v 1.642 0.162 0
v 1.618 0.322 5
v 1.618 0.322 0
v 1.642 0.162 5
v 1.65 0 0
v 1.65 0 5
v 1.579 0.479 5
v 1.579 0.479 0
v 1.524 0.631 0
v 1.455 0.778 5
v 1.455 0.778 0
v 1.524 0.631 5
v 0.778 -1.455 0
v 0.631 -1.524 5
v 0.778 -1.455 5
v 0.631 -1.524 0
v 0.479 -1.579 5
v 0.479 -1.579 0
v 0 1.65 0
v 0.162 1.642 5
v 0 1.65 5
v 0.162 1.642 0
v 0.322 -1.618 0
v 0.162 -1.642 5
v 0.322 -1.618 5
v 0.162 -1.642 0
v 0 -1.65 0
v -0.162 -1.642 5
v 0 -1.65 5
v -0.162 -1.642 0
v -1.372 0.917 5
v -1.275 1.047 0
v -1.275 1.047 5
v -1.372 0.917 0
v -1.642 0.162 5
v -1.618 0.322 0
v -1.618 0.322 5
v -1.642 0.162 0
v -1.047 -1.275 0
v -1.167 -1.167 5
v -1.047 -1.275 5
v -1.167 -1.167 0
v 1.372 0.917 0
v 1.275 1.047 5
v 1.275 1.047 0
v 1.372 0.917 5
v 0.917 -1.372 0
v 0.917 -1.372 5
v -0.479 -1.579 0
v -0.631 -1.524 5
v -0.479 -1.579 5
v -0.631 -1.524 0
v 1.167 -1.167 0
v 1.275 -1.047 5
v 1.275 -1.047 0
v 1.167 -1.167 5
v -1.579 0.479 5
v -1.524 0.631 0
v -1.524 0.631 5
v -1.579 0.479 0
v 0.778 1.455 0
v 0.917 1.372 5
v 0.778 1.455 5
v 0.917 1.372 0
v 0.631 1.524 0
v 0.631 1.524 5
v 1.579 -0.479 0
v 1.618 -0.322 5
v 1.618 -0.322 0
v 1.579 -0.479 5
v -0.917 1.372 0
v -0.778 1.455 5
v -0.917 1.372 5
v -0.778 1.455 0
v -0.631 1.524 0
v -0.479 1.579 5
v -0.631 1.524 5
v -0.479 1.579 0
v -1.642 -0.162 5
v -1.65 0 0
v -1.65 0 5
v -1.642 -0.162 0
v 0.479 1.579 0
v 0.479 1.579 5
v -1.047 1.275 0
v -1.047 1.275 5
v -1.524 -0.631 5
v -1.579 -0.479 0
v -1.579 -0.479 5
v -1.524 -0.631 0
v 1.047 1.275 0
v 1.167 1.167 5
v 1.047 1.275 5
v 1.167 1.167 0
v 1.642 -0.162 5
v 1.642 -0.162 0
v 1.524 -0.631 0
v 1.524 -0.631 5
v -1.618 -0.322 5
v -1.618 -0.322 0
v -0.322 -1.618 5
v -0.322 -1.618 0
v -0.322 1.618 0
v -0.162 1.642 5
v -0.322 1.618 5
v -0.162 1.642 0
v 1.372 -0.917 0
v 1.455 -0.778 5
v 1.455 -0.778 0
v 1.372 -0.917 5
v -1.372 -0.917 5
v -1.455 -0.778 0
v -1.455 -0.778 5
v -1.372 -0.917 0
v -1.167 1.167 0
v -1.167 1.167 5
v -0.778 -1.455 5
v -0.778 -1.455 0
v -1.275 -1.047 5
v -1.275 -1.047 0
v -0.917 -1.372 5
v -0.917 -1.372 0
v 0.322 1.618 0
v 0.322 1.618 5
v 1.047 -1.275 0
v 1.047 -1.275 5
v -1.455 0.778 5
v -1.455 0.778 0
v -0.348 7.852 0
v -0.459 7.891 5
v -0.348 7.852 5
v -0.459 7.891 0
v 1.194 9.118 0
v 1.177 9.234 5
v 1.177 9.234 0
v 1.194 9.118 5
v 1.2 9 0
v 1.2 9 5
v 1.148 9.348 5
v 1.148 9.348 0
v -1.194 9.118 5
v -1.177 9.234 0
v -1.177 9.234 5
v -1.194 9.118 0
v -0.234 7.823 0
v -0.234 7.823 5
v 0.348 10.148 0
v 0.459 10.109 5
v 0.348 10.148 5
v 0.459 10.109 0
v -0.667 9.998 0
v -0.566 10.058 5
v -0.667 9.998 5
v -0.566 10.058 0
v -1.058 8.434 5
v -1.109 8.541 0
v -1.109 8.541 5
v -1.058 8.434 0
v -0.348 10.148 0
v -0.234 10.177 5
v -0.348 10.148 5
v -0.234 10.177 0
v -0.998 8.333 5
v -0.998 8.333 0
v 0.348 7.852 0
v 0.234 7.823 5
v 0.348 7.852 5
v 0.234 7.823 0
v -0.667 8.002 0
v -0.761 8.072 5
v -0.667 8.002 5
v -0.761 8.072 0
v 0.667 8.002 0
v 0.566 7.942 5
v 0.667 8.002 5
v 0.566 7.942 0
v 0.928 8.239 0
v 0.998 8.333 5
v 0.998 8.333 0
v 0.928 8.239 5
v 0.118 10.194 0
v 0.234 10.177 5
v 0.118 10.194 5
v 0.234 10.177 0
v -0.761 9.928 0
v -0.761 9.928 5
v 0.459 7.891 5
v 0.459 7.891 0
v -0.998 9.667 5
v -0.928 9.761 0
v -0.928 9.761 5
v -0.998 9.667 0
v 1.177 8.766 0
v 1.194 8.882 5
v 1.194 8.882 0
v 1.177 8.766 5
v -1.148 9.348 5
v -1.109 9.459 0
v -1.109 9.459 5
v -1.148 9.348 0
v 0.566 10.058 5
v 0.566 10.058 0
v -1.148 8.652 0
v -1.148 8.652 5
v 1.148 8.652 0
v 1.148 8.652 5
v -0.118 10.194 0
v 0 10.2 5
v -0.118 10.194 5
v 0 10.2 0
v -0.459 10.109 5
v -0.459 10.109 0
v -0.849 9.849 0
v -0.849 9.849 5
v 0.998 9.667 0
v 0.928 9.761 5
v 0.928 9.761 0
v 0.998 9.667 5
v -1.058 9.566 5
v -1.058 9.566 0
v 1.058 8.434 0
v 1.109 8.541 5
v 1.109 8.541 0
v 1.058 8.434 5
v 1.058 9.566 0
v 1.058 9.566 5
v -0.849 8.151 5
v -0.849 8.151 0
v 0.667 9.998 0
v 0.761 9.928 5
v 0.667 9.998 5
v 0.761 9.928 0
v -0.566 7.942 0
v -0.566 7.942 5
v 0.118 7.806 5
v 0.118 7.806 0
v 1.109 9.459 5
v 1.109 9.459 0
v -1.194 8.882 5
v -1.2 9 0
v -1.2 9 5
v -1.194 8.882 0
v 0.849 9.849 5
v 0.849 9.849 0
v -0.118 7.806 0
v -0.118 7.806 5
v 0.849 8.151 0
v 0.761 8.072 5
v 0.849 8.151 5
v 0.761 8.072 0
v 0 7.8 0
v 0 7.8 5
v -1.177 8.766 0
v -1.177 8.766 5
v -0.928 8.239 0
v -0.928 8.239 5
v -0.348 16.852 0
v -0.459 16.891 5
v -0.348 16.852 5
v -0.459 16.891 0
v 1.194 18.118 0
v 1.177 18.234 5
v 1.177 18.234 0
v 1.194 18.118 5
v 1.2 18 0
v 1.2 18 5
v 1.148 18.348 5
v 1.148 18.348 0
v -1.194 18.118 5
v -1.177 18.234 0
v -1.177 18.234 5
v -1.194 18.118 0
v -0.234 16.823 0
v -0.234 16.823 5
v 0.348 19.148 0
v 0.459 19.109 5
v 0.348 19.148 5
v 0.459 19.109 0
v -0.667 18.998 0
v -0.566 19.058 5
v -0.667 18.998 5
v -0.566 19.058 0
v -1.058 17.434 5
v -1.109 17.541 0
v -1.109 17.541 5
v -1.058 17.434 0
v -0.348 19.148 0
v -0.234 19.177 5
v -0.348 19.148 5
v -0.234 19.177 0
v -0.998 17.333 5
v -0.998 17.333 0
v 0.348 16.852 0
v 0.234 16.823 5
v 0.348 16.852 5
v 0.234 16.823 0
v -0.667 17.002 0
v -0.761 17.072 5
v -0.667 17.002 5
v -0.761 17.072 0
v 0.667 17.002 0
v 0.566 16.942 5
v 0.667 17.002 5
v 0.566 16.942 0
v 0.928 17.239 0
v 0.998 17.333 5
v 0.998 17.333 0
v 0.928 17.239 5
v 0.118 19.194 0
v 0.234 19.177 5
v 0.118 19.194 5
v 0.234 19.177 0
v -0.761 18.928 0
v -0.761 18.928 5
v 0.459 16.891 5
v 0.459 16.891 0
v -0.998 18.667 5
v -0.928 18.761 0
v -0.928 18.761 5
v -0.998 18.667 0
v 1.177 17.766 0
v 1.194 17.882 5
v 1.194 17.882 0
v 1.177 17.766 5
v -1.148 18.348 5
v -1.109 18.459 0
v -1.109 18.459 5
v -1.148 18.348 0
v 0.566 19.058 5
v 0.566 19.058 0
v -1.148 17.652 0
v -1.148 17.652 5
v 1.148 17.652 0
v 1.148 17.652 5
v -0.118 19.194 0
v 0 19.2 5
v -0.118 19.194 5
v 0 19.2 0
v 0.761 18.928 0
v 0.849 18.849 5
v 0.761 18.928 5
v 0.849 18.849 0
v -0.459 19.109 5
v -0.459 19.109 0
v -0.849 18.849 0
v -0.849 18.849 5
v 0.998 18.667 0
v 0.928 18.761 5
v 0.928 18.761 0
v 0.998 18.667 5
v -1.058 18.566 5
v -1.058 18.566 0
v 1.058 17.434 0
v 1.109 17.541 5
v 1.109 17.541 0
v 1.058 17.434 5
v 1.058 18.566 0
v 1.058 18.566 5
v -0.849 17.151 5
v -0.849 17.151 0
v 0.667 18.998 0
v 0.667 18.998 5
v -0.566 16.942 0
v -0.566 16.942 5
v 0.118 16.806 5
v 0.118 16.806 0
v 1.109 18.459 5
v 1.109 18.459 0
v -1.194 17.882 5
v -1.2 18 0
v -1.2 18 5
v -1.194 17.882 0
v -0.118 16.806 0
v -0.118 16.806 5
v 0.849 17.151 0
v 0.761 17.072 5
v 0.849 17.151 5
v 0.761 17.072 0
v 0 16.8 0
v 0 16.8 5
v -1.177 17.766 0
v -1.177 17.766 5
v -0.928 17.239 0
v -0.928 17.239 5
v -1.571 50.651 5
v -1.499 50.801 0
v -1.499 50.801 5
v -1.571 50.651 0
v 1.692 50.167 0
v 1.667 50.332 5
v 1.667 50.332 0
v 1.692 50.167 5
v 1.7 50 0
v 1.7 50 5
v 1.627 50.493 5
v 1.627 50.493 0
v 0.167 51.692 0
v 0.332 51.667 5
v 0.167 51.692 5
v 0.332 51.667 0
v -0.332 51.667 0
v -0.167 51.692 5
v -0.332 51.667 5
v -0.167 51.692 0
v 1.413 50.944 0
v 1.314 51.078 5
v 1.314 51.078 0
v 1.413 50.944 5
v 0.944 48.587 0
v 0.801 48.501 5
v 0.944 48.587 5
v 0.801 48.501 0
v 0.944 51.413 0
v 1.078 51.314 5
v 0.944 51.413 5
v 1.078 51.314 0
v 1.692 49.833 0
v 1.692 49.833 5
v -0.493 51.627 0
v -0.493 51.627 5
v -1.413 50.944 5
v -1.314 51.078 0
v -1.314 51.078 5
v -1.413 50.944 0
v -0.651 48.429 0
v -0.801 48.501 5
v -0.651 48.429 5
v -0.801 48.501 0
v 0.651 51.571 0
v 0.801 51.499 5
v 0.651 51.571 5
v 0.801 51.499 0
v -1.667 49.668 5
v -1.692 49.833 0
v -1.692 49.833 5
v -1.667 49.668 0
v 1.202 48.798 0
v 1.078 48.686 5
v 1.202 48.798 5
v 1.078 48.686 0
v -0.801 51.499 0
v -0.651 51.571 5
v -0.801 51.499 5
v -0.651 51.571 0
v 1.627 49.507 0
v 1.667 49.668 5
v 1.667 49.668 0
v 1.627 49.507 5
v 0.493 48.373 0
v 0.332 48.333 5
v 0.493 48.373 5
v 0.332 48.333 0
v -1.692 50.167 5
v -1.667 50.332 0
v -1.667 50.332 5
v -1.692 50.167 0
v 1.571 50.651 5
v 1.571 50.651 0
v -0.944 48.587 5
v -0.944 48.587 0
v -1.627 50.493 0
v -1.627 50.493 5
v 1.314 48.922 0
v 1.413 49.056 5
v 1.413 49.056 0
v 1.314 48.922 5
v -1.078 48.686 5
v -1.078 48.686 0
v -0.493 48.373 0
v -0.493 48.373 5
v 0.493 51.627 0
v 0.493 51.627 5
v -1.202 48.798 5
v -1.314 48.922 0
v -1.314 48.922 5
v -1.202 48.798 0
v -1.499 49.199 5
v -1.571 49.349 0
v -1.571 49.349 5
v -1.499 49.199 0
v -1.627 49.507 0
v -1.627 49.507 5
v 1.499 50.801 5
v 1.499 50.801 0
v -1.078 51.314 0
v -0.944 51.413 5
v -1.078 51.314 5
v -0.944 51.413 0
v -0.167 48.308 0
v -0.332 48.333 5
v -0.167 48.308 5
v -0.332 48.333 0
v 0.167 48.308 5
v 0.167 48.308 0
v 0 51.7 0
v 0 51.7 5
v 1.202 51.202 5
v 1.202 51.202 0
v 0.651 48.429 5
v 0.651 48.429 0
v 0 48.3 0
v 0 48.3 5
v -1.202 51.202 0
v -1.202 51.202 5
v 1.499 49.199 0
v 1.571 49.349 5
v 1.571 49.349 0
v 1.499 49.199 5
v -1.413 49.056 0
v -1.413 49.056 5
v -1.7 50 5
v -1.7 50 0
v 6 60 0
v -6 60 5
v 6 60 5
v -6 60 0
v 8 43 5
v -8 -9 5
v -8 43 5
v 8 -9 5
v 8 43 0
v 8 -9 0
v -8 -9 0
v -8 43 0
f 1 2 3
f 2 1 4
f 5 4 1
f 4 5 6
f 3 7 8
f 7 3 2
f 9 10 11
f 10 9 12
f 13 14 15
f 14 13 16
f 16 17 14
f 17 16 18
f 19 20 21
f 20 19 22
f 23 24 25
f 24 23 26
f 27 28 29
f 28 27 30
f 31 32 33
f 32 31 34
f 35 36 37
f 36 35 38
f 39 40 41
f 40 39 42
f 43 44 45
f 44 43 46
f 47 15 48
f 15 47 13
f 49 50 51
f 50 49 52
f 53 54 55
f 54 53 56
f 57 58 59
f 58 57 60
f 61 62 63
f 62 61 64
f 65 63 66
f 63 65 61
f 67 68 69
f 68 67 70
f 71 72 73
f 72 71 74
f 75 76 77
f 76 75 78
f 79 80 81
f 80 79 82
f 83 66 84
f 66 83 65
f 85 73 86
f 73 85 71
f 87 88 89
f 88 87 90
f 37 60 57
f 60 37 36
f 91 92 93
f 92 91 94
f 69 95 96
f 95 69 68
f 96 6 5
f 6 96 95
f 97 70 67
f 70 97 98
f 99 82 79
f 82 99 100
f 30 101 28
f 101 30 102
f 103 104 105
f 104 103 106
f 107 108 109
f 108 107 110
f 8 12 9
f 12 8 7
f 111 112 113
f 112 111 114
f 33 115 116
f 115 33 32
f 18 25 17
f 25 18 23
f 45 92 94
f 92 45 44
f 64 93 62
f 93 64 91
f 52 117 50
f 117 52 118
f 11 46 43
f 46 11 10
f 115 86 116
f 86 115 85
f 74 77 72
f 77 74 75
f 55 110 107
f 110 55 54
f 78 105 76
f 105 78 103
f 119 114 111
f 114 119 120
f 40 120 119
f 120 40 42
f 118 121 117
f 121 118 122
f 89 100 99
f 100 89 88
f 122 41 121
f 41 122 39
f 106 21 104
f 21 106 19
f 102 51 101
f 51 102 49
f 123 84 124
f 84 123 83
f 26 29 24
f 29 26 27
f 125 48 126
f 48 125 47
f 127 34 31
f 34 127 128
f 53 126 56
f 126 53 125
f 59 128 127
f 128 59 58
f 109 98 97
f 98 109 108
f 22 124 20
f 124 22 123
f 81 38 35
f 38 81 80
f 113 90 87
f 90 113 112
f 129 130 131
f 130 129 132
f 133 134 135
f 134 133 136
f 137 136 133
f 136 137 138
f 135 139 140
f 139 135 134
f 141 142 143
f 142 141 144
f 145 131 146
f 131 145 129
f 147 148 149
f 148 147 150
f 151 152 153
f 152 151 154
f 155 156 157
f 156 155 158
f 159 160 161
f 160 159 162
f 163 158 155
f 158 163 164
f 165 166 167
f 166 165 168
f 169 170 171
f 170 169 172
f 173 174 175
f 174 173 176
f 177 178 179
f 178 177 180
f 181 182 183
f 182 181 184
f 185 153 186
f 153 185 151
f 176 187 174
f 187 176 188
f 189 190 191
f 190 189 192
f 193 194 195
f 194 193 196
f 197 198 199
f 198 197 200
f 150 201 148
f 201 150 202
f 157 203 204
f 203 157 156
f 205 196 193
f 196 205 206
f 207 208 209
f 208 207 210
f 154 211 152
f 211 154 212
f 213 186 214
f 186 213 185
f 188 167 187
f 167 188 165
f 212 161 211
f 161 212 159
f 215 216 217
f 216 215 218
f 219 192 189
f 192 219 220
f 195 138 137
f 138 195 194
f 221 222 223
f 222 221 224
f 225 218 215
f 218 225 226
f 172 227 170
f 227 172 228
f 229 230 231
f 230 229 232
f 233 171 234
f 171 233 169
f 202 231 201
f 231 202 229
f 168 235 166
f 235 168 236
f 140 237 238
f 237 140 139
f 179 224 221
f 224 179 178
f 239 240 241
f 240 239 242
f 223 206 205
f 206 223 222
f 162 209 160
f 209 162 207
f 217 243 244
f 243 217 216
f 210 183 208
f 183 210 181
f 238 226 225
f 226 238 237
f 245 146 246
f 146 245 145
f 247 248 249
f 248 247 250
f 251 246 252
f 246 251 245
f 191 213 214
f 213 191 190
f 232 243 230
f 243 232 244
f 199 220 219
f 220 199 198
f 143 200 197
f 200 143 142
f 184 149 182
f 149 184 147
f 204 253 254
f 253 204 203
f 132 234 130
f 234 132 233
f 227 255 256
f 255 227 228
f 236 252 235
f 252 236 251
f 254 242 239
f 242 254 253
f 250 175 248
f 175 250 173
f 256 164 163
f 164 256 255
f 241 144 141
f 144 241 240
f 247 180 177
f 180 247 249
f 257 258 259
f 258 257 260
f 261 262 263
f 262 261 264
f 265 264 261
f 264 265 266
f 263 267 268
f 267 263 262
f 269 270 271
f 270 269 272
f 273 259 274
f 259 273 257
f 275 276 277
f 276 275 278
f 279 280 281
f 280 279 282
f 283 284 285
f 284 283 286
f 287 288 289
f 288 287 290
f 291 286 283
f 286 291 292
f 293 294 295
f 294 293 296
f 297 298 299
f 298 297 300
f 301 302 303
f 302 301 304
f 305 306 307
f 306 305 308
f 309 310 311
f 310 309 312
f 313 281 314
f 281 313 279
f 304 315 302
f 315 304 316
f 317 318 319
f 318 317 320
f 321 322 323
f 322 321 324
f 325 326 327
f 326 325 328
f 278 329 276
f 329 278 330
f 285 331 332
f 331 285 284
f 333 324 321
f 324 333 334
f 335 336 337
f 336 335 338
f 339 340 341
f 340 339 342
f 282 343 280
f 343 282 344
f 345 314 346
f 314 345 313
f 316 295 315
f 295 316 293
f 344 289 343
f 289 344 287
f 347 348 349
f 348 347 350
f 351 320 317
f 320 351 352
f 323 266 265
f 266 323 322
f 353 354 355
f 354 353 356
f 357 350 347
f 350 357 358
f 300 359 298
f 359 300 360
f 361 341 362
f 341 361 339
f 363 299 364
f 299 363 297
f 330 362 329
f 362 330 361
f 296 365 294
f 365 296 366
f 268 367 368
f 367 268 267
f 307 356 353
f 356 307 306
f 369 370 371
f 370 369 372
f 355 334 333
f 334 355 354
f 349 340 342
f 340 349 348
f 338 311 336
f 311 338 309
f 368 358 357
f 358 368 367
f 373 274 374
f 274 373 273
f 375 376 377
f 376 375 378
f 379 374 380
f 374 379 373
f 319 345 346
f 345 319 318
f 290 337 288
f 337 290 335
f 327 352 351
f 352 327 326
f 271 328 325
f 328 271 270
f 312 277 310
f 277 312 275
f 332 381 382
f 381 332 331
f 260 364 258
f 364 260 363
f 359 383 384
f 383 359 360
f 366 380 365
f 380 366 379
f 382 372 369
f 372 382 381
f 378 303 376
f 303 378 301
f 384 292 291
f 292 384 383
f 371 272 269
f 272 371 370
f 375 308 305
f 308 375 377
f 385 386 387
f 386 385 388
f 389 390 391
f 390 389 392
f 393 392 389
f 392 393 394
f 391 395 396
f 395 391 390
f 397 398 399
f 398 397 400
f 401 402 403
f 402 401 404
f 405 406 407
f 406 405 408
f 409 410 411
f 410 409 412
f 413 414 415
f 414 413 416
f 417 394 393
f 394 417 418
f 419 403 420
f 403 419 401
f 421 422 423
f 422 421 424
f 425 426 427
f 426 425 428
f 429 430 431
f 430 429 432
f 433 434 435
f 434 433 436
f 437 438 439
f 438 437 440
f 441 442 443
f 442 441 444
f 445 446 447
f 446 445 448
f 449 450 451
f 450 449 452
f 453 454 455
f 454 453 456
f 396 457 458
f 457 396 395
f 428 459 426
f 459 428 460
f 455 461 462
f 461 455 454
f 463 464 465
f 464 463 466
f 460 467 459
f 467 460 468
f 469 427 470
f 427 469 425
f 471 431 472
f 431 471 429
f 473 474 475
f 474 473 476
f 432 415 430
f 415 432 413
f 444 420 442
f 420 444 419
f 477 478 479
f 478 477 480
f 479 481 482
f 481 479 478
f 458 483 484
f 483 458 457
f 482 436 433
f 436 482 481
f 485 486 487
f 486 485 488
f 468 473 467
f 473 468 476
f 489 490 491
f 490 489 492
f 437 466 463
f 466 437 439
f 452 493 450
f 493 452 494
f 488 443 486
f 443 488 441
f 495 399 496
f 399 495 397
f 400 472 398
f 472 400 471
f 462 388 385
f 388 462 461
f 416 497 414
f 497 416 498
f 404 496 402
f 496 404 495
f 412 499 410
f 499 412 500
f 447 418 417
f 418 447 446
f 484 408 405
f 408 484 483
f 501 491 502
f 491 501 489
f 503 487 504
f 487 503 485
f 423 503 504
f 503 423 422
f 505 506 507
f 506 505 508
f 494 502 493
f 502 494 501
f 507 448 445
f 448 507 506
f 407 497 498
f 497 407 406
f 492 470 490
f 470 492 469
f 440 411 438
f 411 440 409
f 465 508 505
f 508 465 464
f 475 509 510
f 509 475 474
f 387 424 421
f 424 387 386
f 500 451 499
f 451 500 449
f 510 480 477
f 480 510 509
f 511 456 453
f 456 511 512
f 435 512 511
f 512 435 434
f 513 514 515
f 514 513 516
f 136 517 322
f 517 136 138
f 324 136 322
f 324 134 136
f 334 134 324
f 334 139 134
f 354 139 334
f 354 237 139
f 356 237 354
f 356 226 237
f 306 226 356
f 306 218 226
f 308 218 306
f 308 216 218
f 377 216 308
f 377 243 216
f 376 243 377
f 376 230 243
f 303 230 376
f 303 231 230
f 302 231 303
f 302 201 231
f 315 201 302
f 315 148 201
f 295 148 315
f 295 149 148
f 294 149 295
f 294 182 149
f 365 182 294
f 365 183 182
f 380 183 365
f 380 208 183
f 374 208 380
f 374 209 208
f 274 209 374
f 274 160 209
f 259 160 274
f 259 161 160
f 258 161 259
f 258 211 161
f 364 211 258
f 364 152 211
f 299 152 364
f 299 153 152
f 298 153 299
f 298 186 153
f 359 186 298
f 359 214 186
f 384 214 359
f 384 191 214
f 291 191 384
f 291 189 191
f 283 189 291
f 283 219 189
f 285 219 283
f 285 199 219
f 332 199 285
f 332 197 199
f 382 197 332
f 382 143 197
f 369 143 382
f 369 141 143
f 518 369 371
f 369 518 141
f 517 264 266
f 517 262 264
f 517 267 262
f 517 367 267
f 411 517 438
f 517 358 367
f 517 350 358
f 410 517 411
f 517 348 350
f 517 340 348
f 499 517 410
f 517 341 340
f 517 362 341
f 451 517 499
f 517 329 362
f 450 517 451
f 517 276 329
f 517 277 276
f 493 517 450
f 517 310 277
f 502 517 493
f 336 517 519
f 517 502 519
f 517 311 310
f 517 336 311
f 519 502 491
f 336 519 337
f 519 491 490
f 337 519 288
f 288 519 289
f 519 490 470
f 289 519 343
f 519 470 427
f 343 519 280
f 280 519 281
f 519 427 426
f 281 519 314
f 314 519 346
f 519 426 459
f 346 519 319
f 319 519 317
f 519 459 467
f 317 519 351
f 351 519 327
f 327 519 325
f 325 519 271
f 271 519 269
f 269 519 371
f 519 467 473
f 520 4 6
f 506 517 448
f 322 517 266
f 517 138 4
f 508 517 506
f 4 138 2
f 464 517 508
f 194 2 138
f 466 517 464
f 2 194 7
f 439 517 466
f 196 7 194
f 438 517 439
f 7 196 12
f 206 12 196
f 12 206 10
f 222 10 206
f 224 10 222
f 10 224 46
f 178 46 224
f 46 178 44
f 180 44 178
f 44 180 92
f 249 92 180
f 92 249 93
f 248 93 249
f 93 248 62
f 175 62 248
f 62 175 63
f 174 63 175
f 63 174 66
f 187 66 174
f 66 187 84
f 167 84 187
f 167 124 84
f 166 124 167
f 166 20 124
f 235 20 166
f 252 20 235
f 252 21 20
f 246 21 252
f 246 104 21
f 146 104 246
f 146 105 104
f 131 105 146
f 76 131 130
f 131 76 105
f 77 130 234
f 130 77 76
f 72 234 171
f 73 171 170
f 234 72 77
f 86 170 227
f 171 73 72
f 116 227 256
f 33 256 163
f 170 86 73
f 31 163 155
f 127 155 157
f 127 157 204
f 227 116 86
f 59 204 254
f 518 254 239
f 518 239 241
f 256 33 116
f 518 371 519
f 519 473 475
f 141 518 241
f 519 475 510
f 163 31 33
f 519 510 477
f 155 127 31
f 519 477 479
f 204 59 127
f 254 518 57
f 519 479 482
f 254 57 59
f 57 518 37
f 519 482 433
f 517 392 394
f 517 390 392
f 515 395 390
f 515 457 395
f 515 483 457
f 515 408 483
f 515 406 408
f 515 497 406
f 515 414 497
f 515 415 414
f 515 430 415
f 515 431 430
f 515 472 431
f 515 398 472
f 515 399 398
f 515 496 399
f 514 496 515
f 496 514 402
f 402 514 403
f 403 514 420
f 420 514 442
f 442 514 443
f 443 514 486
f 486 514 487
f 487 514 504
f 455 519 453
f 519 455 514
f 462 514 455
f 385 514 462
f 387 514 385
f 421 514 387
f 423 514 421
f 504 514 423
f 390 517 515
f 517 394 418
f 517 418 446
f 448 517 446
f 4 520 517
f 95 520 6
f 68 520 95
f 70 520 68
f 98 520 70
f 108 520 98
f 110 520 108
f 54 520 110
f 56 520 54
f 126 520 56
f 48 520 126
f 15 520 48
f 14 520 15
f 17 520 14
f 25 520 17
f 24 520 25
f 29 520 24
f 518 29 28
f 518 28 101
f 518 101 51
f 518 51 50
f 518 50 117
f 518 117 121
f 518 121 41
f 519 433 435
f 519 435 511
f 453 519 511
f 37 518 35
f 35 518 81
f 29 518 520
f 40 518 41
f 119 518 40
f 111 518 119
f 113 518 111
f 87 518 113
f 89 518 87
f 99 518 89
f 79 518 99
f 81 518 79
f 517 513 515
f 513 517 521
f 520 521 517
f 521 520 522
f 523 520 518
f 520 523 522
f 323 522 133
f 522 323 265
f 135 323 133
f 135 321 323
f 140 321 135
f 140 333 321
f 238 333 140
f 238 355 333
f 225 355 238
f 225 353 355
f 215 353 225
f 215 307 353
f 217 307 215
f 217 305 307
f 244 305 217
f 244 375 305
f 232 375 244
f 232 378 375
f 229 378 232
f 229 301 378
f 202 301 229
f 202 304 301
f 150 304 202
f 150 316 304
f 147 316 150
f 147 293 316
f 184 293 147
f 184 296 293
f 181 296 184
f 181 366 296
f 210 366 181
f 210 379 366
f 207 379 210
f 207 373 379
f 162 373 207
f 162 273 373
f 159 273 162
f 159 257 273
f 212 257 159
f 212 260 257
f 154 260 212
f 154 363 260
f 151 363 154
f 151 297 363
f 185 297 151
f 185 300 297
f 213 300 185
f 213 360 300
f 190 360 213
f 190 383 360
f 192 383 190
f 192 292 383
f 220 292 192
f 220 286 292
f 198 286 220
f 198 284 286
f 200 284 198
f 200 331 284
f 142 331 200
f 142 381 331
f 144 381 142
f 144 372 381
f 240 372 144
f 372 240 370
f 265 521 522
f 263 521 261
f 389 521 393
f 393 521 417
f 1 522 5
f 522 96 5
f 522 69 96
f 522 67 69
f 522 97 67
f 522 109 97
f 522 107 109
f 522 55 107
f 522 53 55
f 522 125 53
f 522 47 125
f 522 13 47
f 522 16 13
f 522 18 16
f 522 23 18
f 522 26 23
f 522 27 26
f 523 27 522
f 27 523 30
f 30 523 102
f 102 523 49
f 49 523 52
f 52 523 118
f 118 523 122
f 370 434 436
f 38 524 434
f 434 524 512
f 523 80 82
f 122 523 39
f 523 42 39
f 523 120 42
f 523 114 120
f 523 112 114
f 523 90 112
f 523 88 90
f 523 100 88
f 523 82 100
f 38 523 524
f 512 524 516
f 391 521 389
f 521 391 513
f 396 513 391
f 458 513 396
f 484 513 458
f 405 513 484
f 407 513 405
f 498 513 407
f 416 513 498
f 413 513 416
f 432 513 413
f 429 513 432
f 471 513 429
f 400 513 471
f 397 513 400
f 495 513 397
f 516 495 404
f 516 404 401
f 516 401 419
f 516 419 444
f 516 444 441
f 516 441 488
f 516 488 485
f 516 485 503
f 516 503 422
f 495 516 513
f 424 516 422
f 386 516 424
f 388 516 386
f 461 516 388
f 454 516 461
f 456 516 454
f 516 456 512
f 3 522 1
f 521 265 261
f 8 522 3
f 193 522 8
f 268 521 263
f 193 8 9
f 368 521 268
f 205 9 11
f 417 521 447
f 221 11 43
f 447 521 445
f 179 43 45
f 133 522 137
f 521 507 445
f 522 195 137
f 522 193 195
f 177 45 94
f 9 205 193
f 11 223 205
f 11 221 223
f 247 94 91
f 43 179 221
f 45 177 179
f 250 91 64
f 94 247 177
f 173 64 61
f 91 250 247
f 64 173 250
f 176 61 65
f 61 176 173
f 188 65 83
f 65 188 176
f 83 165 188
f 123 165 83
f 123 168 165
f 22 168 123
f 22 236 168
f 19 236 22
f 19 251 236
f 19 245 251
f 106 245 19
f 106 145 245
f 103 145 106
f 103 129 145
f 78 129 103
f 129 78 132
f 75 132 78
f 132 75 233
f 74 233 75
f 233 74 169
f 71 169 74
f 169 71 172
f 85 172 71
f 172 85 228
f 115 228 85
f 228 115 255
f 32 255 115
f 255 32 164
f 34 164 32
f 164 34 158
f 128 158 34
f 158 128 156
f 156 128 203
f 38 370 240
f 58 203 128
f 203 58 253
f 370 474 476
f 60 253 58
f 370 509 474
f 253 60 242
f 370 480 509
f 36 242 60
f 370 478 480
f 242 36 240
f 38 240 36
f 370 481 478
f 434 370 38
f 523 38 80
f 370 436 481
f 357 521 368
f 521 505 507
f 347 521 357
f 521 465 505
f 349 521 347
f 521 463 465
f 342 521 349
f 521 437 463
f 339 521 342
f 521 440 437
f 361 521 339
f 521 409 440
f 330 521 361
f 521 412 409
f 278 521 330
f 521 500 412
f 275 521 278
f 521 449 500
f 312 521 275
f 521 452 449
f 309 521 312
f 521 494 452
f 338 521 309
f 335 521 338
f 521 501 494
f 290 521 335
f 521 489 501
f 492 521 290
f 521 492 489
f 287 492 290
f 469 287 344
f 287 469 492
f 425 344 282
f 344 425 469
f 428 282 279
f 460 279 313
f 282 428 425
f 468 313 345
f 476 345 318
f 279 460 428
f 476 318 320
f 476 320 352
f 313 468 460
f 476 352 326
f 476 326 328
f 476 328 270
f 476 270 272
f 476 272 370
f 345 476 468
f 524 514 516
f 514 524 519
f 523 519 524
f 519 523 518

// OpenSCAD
// SystemEdu 参数化夹爪起点，单位 mm；尚未实物打样。
// 全部自制结构 FDM 打印。保留原配摇臂，按实测尺寸修改安装孔。
$fn=64; finger=55; gap=55; bore=3.3;
// 可选：base / moving-finger / servo-cheek / anvil / contact-pad / fit-coupon / angle-bracket
part="moving-finger";
module profile(points,holes,t){difference(){linear_extrude(t)polygon(points);for(h=holes)translate([h[0],h[1],-1])cylinder(h=t+2,r=h[2]);}}
if(part=="base") profile([[-55,0],[55,0],[55,105],[-55,105]],[[-43,10,1.7],[43,10,1.7],[-43,95,1.7],[43,95,1.7],[-15,20,1.7],[15,20,1.7]],5); // qty 1
if(part=="moving-finger") profile([[-8,-9],[8,-9],[8,finger-12],[6,finger+5],[-6,finger+5],[-8,finger-12]],[[0,0,bore/2],[0,9,1.2],[0,18,1.2],[0,finger-5,1.7]],5); // qty 1
if(part=="servo-cheek") profile([[-22,0],[22,0],[16,gap+28],[-16,gap+28]],[[-13,7,1.7],[13,7,1.7],[-10,gap+8,1.2],[10,gap+8,1.2]],5); // qty 2
if(part=="anvil") profile([[-18,0],[18,0],[18,48],[-18,48]],[[-12,8,1.7],[12,8,1.7],[-12,40,1.7],[12,40,1.7]],6); // qty 1
if(part=="contact-pad") profile([[-10,0],[10,0],[10,16],[-10,16]],[[0,8,1.7]],3); // qty 1
if(part=="fit-coupon") profile([[-22,0],[22,0],[22,20],[-22,20]],[[-13,10,(bore-.1)/2],[0,10,bore/2],[13,10,(bore+.1)/2]],4); // qty 1
if(part=="angle-bracket") profile([[0,0],[24,0],[24,5],[5,5],[5,24],[0,24]],[],18); // qty 4
// finger、gap、bore 直接驱动相关零件。修改后 F6 渲染并重新导出 STL。
// 直角座需增加穿过两侧面的安装孔；坐标按本人底座/支架匹配。参见制作指南。
